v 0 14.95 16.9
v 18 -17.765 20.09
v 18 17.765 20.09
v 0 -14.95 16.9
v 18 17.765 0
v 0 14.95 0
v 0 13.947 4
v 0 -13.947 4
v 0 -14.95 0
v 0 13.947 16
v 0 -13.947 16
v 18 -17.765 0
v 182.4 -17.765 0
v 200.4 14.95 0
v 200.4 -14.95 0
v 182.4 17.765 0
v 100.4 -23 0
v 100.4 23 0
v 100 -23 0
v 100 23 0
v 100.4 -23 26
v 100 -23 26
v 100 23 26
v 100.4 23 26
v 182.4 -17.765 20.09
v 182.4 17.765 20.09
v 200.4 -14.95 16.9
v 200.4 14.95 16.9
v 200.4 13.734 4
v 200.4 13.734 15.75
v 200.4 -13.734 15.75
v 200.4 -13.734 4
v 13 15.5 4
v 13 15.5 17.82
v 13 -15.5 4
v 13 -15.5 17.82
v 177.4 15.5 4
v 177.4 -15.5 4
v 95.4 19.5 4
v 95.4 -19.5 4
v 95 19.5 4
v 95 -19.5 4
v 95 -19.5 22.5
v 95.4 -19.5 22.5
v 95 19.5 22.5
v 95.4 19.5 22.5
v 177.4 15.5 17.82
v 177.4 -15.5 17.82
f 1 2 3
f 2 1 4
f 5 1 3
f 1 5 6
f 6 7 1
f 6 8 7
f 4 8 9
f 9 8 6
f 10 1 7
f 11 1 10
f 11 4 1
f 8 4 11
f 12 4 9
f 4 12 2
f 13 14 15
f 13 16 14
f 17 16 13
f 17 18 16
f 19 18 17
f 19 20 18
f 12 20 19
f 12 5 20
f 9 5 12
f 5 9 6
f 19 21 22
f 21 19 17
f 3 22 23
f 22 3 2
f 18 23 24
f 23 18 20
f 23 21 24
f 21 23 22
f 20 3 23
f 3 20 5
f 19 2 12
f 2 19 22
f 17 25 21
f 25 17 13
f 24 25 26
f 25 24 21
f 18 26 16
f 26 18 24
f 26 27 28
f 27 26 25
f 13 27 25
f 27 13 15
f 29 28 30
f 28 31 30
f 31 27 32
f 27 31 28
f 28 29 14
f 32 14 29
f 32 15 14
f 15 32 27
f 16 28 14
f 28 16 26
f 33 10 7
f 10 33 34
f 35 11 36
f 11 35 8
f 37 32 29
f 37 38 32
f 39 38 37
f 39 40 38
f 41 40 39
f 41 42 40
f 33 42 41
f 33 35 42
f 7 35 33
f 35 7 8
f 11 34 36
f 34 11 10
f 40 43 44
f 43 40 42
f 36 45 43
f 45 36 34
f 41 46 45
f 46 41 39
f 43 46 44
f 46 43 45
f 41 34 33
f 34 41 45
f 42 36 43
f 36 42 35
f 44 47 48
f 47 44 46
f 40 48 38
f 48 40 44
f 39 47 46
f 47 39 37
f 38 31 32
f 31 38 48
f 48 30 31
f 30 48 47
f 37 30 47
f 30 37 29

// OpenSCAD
$fn = 32;

// ----------------------------------------------------------------------
// Faired channel: 200 x 46 x 26 mm, 3.5 mm walls, faired ends
// ----------------------------------------------------------------------

// --- parameters (mm) ---
length = 200;             // channel length
width = 46;               // channel width at mid length
height = 26;              // channel height at mid length
wall = 3.5;               // side wall thickness
floor_t = 4;              // floor thickness
end_w = 29.9;             // faired end width
end_h = 16.9;             // faired end height

difference() {
  union() {
    hull() {
      translate([0, -14.95, 0]) cube([0.4, 29.9, 16.9]);
      translate([18, -17.765, 0]) cube([0.4, 35.53, 20.09]);
    }
    hull() {
      translate([18, -17.765, 0]) cube([0.4, 35.53, 20.09]);
      translate([100, -23, 0]) cube([0.4, 46, 26]);
    }
    hull() {
      translate([100, -23, 0]) cube([0.4, 46, 26]);
      translate([182, -17.765, 0]) cube([0.4, 35.53, 20.09]);
    }
    hull() {
      translate([182, -17.765, 0]) cube([0.4, 35.53, 20.09]);
      translate([200, -14.95, 0]) cube([0.4, 29.9, 16.9]);
    }
  }
  /* cavity, 5 mm proud of both ends so the ports are cut clean */
  hull() {
    translate([-5, -13.35, 4]) cube([0.4, 26.7, 11.3]);
    translate([13, -15.5, 4]) cube([0.4, 31, 13.82]);
  }
  hull() {
    translate([13, -15.5, 4]) cube([0.4, 31, 13.82]);
    translate([95, -19.5, 4]) cube([0.4, 39, 18.5]);
  }
  hull() {
    translate([95, -19.5, 4]) cube([0.4, 39, 18.5]);
    translate([177, -15.5, 4]) cube([0.4, 31, 13.82]);
  }
  hull() {
    translate([177, -15.5, 4]) cube([0.4, 31, 13.82]);
    translate([205, -13.35, 4]) cube([0.4, 26.7, 11.3]);
  }
}
